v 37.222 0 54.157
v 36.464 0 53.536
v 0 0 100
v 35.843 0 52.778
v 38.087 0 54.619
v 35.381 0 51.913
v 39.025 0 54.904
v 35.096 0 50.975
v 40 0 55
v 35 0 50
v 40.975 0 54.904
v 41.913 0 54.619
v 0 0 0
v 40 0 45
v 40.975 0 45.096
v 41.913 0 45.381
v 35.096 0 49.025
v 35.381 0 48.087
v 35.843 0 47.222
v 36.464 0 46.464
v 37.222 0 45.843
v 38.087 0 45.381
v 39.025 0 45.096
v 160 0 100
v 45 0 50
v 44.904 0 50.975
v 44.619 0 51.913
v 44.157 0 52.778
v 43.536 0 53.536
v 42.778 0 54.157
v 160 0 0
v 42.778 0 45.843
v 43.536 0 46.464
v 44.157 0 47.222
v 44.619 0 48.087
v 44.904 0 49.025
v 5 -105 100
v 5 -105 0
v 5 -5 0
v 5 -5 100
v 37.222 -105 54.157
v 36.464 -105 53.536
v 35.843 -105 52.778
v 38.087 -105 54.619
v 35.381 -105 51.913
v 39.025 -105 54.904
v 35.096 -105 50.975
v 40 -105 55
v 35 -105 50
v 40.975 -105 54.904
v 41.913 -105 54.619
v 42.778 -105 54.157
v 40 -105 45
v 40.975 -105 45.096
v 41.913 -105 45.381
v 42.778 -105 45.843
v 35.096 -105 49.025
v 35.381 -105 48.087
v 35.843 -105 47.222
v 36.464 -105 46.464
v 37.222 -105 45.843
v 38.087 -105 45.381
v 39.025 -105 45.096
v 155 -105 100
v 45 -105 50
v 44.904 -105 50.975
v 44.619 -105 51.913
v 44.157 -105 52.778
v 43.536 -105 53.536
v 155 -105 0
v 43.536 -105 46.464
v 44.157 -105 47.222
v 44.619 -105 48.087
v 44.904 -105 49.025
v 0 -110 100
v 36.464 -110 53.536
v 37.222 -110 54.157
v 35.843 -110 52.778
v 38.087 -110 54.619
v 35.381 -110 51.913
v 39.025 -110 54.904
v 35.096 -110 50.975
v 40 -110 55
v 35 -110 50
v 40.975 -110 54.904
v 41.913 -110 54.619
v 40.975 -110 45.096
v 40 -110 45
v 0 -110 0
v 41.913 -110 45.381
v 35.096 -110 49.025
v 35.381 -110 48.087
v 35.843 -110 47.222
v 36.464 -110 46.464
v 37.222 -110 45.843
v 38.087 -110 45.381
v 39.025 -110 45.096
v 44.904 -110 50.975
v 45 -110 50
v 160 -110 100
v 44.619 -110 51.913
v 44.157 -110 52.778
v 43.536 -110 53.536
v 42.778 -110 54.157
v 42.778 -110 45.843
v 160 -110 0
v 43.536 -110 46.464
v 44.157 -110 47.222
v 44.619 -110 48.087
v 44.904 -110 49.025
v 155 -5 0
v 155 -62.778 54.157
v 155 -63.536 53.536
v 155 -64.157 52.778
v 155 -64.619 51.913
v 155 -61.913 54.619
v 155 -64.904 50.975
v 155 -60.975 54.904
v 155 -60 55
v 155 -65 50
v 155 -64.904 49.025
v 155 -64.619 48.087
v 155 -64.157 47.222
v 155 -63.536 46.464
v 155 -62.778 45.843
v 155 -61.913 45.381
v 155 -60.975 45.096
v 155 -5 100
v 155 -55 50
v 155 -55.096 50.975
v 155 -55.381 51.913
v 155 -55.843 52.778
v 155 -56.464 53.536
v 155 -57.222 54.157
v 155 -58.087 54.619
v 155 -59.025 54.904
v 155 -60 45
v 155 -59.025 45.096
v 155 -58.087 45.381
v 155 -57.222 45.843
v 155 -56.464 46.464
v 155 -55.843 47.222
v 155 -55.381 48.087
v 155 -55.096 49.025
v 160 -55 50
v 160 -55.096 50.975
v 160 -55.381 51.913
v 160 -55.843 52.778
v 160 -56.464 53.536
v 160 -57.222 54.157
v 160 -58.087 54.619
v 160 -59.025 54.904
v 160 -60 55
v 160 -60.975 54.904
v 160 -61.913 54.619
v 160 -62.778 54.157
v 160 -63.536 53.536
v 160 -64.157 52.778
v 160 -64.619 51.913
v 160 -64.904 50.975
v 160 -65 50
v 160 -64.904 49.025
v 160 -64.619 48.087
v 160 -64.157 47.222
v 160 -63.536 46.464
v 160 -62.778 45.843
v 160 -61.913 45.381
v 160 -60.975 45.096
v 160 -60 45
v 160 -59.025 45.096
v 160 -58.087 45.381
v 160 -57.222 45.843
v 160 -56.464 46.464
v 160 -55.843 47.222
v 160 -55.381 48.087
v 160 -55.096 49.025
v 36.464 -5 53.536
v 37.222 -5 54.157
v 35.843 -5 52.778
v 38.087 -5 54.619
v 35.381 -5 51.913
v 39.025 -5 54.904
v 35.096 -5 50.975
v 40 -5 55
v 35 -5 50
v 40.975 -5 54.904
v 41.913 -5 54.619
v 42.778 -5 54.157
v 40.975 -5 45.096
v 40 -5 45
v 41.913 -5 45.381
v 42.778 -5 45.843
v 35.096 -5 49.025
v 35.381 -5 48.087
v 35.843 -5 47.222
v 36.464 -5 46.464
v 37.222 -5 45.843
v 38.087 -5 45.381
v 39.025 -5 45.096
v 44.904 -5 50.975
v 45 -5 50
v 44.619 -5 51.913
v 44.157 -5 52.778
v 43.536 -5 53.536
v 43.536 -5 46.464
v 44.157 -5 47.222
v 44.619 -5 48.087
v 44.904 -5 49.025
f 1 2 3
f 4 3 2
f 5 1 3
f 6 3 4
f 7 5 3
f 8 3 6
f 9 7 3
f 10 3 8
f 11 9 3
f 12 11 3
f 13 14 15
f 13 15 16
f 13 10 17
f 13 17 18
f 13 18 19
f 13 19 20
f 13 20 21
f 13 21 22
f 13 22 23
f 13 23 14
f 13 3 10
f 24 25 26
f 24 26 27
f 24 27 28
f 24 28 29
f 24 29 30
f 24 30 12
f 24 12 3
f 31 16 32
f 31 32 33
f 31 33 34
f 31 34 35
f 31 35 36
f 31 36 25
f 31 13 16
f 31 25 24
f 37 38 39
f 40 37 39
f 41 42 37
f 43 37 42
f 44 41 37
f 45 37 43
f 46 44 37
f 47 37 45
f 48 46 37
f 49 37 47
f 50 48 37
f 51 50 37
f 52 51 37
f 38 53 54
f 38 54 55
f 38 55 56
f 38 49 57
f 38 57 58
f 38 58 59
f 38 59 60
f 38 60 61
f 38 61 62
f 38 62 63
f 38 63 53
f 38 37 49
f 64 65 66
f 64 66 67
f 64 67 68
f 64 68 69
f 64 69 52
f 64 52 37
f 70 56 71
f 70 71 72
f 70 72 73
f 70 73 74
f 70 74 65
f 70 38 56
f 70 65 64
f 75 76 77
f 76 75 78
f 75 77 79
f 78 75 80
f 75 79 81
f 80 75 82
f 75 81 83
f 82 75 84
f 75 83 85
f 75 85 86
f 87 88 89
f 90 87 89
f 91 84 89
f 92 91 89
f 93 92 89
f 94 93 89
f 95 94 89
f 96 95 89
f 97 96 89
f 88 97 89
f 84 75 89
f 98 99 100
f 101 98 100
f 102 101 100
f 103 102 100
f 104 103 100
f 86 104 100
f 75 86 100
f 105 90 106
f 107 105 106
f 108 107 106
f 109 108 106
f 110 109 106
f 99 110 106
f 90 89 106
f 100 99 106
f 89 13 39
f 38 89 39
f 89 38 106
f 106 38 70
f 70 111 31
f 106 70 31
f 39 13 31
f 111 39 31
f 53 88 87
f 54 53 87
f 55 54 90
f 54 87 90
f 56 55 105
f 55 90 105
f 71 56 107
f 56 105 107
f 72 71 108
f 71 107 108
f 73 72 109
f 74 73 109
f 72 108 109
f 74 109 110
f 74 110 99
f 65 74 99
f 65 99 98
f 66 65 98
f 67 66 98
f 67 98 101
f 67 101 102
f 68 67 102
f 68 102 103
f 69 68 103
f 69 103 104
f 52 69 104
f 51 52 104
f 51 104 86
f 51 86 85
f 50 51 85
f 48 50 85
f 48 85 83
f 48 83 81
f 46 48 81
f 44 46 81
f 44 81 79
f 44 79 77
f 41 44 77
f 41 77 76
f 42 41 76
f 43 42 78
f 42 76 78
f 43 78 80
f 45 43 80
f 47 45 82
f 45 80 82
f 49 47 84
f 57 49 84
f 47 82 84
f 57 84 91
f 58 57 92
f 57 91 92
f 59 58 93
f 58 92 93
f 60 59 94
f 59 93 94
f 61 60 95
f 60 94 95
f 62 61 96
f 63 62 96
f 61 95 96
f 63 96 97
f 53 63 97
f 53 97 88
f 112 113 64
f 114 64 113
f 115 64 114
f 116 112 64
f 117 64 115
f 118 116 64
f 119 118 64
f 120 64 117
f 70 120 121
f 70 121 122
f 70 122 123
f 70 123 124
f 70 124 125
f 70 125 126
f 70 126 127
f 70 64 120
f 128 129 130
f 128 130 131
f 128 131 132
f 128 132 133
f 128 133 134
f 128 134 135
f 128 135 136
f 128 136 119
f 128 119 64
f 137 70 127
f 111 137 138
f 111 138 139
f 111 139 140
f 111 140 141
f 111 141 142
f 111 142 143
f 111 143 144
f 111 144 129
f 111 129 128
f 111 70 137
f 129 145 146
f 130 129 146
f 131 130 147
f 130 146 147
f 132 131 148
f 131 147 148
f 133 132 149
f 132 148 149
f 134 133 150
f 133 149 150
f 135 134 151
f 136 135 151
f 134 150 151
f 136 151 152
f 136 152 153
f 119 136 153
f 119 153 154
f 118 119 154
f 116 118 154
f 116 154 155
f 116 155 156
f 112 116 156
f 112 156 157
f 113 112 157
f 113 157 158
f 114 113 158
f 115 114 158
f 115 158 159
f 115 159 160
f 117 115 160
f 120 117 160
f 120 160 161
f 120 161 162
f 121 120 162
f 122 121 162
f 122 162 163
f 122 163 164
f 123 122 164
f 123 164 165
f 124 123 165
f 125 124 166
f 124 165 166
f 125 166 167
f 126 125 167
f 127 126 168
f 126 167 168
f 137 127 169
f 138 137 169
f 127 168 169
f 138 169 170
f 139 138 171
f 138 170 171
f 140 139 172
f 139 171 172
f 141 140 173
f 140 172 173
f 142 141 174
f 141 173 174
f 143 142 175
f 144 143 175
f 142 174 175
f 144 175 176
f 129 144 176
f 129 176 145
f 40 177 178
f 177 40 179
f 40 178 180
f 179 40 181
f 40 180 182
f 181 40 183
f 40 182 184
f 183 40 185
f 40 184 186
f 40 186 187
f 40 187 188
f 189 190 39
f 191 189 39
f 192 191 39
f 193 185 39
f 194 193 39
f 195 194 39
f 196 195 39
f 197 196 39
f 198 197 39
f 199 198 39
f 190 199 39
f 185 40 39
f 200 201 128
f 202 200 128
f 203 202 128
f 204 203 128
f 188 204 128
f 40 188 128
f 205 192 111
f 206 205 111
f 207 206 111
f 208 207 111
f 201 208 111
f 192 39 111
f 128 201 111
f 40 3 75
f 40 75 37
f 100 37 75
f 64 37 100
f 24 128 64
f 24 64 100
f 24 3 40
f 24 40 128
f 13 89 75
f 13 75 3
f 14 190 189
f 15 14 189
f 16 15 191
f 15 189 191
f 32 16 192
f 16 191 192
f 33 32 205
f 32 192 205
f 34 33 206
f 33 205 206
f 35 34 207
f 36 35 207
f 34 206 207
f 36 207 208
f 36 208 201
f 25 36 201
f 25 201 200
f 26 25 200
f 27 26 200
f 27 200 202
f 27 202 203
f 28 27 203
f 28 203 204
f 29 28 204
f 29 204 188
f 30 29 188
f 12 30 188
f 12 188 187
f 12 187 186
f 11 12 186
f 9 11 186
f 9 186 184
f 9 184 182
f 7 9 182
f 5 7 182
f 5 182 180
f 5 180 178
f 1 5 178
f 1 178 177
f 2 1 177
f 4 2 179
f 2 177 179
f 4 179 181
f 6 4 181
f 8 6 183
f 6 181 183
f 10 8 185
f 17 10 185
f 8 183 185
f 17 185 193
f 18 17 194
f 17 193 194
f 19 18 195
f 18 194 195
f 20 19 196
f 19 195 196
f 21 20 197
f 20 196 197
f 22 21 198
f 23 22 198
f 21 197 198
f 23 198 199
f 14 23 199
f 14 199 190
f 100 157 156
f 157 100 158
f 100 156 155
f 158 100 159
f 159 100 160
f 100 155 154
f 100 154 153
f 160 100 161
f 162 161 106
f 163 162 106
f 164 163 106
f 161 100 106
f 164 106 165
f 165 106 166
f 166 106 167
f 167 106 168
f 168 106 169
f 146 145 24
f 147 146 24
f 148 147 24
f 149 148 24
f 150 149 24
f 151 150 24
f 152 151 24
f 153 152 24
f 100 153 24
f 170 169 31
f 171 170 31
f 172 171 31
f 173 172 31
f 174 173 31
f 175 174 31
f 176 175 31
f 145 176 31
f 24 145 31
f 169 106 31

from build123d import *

# Parameters (mm, degrees)
SKETCH1_W           = 160
SKETCH1_H           = 110
SKETCH1_W_2         = 150
SKETCH1_H_2         = 100
BOSS_EXTRUDE1_DEPTH = 100
SKETCH2_R           = 5
CUT_EXTRUDE1_DEPTH  = 240
SKETCH3_R           = 5
CUT_EXTRUDE2_DEPTH  = 10


with BuildPart() as part:
    # Sketch1 → Boss-Extrude1 (new body)
    with BuildSketch(Plane.XY):
        with Locations((80, -55)):
            Rectangle(SKETCH1_W, SKETCH1_H)
        with Locations((80, -55)):
            Rectangle(SKETCH1_W_2, SKETCH1_H_2, mode=Mode.SUBTRACT)
    extrude(amount=BOSS_EXTRUDE1_DEPTH)

    # Sketch2 → Cut-Extrude1 (cut)
    with BuildSketch(Plane.XZ.offset(110)):
        with Locations(Location((40, 50, 0), (0, 0, 270))):
            Circle(SKETCH2_R)
    extrude(amount=-CUT_EXTRUDE1_DEPTH, mode=Mode.SUBTRACT)

    # Sketch3 → Cut-Extrude2 (cut)
    with BuildSketch(Plane(origin=(160, 0, 0), x_dir=(0, 0, -1), z_dir=(1, 0, 0))):
        with Locations(Location((-50, -60, 0), (0, 0, 90))):
            Circle(SKETCH3_R)
    extrude(amount=-CUT_EXTRUDE2_DEPTH, mode=Mode.SUBTRACT)


solid = part.part
